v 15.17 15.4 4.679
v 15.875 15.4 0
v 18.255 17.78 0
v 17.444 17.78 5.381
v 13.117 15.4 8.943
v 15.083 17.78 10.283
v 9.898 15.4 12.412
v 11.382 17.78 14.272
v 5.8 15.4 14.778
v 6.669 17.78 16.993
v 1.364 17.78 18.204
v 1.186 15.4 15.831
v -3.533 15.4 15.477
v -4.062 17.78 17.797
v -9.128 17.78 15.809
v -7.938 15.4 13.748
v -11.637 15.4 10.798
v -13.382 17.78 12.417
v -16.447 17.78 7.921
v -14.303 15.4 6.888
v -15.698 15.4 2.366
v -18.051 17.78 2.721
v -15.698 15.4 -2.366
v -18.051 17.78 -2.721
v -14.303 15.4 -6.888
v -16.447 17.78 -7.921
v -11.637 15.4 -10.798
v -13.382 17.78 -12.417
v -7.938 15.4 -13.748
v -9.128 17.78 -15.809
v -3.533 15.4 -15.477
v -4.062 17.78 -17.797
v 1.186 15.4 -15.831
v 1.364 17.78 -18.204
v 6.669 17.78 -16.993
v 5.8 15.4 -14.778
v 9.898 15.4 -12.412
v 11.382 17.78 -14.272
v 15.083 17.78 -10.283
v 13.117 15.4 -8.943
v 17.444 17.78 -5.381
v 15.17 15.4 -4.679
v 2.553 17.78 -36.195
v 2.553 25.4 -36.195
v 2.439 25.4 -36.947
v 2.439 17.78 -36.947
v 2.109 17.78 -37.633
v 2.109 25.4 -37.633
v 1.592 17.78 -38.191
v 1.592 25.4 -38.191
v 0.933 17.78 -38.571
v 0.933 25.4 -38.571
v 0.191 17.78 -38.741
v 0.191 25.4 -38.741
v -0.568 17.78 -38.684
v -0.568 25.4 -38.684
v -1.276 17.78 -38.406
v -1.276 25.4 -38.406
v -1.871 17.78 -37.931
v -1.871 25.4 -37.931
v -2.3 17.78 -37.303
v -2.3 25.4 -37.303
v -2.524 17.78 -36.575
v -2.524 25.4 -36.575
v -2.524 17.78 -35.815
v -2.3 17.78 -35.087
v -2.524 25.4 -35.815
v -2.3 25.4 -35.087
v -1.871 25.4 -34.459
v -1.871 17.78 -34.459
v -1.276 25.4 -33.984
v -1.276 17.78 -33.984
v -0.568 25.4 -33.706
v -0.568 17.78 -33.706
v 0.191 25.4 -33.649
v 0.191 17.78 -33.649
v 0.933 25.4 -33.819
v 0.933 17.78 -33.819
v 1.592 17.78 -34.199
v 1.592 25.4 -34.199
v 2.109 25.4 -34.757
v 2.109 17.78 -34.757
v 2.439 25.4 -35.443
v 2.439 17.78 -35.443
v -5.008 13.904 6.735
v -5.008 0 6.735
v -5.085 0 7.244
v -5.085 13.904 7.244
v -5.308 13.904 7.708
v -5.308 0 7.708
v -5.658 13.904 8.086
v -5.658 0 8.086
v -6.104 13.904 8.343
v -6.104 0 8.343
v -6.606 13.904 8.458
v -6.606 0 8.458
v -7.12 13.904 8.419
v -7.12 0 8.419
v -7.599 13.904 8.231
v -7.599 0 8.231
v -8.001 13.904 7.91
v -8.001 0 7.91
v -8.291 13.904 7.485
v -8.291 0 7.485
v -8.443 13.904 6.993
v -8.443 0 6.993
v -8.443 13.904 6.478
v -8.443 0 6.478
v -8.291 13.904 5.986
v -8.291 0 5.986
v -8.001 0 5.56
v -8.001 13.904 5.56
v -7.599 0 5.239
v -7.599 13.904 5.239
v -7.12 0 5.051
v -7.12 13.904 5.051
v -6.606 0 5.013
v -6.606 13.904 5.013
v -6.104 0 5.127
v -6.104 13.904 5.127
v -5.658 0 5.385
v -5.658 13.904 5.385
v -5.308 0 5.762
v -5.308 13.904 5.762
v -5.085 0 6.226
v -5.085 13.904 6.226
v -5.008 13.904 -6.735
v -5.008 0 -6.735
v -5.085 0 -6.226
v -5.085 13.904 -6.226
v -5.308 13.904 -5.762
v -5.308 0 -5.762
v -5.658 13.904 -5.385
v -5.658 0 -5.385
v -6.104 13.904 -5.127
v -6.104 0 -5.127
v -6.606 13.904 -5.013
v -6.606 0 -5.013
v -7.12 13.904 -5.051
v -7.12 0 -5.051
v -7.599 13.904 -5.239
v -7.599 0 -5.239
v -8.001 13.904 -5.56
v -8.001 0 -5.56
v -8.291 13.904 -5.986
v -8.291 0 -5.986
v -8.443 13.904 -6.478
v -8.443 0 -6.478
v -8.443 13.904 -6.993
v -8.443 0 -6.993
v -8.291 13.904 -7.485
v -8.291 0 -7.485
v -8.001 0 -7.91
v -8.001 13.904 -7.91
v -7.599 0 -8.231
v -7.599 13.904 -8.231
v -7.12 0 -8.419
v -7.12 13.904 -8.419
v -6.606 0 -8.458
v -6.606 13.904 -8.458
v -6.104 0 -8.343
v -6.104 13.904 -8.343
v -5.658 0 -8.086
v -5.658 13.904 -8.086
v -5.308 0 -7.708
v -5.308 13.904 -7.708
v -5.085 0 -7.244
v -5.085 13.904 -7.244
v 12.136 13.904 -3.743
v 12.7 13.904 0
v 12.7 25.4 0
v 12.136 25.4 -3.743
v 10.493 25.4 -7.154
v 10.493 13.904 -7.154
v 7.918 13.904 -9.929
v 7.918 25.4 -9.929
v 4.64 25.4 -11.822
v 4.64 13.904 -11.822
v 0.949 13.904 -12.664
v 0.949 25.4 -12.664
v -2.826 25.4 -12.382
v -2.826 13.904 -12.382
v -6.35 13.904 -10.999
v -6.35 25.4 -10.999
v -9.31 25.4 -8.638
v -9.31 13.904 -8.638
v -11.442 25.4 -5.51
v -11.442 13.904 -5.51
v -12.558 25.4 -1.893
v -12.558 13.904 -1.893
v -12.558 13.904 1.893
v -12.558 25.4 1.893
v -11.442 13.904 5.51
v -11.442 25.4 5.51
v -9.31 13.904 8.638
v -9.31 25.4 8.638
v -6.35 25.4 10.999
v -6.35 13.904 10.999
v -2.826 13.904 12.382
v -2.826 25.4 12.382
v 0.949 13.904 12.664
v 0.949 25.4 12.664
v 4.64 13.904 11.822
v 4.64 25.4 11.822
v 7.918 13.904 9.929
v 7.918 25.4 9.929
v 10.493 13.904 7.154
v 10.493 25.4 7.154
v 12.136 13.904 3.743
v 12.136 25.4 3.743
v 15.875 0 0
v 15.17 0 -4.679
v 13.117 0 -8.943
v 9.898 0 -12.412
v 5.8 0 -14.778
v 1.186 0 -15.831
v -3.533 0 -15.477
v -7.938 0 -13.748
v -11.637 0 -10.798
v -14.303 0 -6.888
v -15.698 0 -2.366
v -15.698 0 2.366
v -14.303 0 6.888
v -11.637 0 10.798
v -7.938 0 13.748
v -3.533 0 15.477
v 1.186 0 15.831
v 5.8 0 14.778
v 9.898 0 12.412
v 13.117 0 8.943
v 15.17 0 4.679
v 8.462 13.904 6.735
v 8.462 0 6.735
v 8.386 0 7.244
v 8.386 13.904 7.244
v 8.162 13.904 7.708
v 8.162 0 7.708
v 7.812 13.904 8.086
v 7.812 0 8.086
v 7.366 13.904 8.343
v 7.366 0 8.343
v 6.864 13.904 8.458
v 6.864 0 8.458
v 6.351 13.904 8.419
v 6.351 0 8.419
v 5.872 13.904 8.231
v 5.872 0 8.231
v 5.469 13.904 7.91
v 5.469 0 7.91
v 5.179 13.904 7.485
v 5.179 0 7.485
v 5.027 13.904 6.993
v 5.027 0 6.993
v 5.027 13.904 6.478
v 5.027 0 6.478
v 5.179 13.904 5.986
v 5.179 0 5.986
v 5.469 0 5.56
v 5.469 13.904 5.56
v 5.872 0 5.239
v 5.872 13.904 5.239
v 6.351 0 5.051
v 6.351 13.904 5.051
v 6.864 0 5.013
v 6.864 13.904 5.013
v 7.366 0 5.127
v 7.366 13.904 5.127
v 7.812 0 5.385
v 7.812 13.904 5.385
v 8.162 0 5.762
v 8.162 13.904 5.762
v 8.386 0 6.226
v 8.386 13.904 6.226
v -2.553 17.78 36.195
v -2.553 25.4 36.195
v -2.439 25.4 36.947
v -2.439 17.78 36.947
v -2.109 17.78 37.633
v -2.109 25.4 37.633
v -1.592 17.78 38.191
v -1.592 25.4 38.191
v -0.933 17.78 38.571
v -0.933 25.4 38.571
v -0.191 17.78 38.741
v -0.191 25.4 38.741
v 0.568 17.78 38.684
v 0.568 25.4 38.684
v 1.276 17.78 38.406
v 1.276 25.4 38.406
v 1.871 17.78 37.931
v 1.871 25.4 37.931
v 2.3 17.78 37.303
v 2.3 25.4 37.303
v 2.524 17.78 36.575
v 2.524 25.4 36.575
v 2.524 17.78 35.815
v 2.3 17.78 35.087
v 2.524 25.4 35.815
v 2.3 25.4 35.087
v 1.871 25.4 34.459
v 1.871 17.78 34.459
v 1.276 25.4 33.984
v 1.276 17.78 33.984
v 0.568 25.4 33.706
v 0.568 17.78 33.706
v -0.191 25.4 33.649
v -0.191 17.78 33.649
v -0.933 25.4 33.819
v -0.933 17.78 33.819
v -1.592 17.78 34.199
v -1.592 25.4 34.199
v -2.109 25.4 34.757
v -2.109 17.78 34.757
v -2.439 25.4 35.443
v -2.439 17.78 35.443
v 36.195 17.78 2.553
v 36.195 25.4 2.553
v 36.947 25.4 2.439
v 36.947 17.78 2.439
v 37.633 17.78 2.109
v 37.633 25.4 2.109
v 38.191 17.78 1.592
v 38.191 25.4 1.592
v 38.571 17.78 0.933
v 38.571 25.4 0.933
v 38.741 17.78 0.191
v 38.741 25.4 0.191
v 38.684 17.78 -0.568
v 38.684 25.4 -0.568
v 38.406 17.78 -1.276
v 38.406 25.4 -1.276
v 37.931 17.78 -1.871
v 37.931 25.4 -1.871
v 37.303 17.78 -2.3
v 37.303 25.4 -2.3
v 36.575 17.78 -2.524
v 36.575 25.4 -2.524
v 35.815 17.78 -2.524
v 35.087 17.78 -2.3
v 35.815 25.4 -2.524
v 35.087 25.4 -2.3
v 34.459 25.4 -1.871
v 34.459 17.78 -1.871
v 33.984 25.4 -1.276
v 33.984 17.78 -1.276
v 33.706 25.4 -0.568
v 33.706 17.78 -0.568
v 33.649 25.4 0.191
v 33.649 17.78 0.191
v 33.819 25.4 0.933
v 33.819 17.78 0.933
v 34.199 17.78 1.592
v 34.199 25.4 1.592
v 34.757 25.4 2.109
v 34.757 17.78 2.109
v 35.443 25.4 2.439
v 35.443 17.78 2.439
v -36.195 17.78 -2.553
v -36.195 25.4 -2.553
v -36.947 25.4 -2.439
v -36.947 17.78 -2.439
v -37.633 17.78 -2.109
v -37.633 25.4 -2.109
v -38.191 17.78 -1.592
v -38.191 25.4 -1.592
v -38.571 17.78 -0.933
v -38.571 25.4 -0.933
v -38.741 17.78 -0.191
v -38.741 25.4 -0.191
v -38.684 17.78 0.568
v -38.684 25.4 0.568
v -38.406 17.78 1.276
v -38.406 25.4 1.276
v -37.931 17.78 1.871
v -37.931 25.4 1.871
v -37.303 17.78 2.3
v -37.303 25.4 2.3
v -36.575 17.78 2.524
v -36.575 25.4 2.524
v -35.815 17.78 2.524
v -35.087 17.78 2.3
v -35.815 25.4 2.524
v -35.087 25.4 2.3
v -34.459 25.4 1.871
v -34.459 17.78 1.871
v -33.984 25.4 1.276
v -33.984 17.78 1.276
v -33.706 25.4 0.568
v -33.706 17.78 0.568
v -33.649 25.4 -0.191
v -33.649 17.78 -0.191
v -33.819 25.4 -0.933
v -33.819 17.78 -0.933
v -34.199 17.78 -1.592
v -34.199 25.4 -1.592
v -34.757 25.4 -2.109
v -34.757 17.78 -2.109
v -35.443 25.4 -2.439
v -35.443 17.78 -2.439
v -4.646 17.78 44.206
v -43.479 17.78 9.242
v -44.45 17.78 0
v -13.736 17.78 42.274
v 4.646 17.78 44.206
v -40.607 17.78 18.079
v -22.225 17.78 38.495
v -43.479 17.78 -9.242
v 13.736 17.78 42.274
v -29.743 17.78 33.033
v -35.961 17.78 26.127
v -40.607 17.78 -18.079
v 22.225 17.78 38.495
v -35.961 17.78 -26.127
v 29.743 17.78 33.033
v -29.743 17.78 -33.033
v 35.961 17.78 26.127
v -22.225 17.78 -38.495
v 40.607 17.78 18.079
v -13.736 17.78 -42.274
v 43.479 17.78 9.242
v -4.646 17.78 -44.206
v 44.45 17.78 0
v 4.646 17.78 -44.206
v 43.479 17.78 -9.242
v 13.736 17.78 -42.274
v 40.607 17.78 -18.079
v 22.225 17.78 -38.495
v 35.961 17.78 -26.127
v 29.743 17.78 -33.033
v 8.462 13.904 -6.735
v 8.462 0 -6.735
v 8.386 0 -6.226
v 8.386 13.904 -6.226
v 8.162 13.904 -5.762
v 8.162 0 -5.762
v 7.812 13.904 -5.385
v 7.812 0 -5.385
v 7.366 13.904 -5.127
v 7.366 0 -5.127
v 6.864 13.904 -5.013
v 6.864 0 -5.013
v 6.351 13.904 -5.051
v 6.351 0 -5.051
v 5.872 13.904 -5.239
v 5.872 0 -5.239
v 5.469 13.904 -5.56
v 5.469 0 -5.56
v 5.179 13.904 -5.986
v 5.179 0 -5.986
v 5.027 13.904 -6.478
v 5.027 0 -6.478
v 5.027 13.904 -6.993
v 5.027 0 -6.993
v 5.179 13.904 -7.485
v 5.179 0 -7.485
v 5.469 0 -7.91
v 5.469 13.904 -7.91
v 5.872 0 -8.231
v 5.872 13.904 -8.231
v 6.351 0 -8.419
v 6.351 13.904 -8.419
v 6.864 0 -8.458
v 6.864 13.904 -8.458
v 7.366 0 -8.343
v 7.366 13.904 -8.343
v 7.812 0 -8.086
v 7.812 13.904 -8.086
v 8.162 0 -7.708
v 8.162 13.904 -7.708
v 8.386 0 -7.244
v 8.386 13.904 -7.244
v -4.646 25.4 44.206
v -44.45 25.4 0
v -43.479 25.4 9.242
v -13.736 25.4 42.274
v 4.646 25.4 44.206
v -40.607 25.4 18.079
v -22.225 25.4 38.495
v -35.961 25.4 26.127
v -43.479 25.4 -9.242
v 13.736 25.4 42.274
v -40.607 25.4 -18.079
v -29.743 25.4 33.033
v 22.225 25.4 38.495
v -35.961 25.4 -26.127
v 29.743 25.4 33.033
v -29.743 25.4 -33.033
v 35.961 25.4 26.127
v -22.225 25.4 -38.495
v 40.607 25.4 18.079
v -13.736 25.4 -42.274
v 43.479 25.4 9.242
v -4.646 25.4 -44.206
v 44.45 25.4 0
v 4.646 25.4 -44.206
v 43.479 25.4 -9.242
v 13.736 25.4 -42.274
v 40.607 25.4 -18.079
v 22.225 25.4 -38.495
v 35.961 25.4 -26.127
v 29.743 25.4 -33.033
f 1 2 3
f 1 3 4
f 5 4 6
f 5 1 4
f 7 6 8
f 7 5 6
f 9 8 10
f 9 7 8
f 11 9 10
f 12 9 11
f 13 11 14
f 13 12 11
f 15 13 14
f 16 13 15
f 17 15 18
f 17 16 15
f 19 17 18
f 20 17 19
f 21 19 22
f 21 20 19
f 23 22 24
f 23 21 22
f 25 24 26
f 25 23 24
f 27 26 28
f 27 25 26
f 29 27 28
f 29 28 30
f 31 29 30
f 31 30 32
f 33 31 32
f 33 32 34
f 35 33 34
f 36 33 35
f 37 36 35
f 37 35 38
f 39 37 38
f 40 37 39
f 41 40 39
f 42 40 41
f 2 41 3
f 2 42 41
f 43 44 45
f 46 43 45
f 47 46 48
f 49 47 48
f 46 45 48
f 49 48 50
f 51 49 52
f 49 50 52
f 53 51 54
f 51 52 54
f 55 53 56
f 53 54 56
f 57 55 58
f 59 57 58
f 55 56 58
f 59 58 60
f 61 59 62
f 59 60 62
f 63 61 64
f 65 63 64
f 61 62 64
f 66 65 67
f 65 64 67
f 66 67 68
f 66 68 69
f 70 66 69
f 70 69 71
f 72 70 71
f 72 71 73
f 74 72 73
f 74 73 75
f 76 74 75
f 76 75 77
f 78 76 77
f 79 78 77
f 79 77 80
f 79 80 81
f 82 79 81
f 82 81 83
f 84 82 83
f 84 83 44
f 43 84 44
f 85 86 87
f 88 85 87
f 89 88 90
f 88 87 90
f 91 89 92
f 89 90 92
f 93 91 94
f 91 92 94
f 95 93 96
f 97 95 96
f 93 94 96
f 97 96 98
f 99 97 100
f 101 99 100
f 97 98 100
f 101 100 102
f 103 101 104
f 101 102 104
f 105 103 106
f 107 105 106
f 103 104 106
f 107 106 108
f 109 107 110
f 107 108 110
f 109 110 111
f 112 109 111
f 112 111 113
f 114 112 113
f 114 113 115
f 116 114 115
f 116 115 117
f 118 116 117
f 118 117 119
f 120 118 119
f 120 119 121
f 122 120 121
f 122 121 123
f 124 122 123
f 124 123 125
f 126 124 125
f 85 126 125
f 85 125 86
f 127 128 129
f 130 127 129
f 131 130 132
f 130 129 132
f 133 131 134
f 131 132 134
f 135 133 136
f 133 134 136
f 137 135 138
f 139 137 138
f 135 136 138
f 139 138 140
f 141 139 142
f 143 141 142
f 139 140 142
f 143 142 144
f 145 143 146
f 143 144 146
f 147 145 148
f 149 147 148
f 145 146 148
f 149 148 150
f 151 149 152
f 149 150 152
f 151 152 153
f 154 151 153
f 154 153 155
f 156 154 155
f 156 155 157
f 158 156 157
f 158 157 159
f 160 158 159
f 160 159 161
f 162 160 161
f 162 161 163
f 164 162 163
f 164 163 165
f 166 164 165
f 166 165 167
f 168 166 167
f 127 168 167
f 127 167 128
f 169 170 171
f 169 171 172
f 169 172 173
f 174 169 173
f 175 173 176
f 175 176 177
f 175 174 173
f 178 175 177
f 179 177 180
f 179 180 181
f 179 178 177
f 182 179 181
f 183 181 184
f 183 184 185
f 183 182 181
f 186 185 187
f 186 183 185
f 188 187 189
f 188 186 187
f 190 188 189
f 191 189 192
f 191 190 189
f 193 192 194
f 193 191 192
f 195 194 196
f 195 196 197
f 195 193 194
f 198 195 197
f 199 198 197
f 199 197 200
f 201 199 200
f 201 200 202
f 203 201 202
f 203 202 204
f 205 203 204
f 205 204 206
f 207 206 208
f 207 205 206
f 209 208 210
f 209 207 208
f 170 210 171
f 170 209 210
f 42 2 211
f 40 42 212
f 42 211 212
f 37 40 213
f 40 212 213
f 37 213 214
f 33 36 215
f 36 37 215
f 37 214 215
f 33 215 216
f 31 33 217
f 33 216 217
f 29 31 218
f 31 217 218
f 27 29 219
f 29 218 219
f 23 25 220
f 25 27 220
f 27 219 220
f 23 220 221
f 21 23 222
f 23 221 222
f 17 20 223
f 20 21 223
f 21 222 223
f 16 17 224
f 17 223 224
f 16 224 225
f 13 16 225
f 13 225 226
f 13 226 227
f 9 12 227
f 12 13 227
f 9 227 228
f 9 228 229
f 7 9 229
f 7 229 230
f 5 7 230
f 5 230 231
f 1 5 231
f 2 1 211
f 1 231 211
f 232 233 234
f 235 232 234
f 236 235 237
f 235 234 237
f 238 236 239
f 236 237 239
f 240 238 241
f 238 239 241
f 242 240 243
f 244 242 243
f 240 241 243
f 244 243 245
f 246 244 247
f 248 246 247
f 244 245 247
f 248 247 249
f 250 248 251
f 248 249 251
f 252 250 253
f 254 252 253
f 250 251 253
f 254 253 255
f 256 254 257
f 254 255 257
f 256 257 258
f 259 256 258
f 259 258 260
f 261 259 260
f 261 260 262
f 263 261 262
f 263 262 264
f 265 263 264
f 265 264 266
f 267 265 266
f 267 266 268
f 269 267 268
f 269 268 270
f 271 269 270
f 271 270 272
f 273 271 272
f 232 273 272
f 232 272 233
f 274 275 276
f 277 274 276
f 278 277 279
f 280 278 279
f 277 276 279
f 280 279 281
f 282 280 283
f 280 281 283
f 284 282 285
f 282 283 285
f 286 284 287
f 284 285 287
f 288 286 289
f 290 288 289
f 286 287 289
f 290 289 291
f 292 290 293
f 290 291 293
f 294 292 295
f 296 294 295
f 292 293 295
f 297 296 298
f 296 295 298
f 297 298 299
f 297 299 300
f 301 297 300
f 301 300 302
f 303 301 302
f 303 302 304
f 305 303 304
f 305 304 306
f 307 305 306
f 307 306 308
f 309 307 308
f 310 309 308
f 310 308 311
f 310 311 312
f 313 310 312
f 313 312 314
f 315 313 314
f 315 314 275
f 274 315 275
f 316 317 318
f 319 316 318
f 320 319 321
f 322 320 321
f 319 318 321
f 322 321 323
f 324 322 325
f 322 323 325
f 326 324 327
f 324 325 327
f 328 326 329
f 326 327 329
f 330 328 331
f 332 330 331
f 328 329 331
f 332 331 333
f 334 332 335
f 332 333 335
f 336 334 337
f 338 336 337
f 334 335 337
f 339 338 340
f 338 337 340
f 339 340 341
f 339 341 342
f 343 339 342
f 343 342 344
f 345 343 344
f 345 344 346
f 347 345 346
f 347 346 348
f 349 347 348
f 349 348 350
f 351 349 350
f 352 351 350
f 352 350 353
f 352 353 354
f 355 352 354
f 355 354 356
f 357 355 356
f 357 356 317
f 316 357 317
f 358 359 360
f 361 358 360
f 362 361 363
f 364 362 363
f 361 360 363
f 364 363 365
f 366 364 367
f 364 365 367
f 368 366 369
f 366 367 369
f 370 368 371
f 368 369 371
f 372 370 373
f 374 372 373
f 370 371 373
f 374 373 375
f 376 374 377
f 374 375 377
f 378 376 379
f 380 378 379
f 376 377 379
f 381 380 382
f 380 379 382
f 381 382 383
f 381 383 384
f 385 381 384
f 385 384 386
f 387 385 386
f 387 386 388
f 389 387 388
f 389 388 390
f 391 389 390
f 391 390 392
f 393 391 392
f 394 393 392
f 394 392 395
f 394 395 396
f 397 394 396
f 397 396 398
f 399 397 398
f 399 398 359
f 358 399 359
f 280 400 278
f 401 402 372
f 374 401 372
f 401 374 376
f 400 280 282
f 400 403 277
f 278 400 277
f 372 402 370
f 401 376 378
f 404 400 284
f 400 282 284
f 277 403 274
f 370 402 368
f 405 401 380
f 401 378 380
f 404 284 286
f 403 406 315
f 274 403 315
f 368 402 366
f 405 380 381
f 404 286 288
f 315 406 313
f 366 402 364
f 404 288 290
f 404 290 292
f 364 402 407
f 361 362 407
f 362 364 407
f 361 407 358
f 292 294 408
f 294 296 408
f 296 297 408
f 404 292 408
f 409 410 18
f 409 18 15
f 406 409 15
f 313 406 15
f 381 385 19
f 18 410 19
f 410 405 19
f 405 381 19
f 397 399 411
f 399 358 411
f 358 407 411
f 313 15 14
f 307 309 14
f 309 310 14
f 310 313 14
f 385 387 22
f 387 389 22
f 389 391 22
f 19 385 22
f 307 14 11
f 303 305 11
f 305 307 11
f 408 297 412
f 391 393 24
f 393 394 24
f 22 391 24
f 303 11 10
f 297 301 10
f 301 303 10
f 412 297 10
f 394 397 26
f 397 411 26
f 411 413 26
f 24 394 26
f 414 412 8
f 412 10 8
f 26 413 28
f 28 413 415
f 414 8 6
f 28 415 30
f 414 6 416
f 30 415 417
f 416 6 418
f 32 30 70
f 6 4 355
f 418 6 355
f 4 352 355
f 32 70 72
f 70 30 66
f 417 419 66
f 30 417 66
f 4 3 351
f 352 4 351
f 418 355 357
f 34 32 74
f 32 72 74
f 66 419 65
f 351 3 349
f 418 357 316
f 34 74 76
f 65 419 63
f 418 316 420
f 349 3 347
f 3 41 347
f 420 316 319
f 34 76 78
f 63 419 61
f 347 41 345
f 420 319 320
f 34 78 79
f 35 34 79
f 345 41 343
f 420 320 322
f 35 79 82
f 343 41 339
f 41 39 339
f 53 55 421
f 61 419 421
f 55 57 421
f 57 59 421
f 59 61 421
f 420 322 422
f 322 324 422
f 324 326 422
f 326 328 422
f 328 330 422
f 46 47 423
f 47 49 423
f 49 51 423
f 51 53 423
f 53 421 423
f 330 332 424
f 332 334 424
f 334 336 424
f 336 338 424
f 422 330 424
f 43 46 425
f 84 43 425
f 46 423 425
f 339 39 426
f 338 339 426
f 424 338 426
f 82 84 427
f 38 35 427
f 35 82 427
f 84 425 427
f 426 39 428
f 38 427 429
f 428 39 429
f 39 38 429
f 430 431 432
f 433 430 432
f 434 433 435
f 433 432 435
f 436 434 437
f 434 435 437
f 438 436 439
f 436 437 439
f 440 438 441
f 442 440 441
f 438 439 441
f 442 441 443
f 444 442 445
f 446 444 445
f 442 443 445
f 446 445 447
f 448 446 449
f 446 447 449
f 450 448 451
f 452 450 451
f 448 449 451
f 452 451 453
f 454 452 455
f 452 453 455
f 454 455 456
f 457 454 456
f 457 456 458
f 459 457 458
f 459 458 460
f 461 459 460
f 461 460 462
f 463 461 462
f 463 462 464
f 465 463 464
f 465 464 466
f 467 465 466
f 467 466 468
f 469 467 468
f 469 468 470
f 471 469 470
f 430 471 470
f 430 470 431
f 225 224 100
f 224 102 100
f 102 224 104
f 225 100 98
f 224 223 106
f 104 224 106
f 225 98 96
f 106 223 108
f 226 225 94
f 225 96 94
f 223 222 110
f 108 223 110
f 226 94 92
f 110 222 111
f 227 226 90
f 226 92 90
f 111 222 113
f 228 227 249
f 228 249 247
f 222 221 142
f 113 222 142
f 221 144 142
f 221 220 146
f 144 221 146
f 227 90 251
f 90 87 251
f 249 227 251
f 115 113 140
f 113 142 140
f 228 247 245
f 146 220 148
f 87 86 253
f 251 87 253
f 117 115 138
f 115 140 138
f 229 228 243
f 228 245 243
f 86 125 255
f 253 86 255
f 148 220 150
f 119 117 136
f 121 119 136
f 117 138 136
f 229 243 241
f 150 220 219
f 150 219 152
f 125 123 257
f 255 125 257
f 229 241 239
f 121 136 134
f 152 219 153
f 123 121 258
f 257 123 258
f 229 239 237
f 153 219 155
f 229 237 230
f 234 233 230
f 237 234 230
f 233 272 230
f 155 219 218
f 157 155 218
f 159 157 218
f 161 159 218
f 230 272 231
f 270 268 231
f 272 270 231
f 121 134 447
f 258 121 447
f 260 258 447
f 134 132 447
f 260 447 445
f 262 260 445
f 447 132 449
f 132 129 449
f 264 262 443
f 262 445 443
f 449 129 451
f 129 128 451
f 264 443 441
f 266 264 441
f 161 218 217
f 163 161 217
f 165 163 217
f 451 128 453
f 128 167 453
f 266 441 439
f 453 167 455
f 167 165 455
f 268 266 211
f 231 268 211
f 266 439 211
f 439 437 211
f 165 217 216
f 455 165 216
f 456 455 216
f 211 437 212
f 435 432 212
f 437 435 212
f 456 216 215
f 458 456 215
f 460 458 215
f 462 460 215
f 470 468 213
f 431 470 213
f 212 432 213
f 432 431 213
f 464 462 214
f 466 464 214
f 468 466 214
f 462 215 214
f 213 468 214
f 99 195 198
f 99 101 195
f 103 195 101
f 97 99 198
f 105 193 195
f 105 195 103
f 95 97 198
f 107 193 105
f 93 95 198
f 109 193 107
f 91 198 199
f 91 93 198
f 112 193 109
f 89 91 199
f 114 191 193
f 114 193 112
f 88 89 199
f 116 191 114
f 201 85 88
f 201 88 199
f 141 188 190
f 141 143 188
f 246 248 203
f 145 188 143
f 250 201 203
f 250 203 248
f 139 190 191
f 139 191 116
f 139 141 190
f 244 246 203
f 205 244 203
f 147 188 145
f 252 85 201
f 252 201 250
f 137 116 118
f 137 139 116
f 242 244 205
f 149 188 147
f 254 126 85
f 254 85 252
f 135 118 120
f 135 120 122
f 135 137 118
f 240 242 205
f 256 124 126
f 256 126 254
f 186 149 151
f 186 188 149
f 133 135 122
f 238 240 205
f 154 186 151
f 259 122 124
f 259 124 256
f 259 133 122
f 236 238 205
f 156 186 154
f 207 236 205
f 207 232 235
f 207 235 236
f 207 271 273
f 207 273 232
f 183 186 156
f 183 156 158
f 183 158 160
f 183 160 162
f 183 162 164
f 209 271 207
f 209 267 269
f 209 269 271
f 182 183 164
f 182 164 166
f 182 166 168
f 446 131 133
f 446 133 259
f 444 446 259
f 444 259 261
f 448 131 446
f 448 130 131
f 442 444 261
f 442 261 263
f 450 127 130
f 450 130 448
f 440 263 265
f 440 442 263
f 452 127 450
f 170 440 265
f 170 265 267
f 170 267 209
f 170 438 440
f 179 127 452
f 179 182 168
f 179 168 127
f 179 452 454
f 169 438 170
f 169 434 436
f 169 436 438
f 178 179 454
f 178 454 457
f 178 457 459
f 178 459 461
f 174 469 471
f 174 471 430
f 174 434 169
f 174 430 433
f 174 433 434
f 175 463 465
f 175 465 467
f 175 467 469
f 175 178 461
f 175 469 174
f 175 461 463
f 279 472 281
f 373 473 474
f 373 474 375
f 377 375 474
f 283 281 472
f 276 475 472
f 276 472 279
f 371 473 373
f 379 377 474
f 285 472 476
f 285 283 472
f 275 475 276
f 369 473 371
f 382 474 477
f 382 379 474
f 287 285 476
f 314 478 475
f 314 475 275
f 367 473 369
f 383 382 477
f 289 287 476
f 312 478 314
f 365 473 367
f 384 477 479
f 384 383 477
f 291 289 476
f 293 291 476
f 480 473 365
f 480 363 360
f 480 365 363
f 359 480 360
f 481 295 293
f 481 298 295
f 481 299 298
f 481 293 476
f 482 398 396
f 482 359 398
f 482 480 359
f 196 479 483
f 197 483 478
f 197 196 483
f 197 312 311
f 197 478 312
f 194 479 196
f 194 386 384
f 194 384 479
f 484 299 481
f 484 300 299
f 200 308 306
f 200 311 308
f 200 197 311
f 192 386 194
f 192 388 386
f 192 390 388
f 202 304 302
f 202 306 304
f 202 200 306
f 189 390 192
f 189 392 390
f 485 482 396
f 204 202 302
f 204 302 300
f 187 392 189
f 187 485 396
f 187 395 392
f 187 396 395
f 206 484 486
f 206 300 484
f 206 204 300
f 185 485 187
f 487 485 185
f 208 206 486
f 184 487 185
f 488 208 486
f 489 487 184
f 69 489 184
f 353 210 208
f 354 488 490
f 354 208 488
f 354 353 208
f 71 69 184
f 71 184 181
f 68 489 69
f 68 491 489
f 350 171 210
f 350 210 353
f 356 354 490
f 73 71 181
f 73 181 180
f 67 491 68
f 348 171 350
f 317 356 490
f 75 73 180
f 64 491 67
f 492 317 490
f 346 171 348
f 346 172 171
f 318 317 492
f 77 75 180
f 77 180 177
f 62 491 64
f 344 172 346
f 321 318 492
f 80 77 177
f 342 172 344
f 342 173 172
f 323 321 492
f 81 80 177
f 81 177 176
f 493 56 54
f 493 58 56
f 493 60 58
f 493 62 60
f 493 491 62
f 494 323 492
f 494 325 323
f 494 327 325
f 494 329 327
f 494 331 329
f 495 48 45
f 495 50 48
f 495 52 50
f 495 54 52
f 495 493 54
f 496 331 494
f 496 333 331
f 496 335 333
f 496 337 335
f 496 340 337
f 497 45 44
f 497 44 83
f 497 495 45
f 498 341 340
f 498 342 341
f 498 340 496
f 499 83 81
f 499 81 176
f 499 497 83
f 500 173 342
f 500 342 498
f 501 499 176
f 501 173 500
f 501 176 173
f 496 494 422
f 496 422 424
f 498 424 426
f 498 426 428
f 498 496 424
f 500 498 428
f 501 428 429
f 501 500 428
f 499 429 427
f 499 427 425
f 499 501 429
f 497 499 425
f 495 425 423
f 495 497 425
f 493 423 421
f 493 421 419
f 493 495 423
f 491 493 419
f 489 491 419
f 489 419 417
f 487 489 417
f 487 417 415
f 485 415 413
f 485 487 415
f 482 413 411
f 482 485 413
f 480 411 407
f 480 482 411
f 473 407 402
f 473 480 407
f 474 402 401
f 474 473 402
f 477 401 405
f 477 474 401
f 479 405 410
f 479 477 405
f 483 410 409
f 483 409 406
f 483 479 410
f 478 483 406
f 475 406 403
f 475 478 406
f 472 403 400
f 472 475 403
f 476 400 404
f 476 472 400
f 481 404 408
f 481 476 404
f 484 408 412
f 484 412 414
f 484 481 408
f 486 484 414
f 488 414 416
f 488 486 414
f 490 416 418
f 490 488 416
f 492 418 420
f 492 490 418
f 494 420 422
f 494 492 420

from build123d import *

# Parameters (mm, degrees)
SKETCH1_R           = 15.875
BOSS_EXTRUDE1_DEPTH = 25.4
SKETCH4_R           = 44.45
BOSS_EXTRUDE2_DEPTH = 7.62
SKETCH6_R           = 2.5527
CUT_EXTRUDE4_DEPTH  = 26.4
CIRPATTERN2_COUNT   = 4
CUT_EXTRUDE5_START  = -11.49604
SKETCH2_R           = 12.7
CUT_EXTRUDE5_DEPTH  = 11.49604
CHAMFER1_SIZE       = 2.38
SKETCH3_R           = 1.7272
CUT_EXTRUDE6_DEPTH  = 26.4


with BuildPart() as part:
    # Sketch1 → Boss-Extrude1 (new body)
    with BuildSketch(Plane(origin=(0, 0, 0), x_dir=(1, 0, 0), z_dir=(0, 1, 0))):
        Circle(SKETCH1_R)
    extrude(amount=BOSS_EXTRUDE1_DEPTH)

    # Sketch4 → Boss-Extrude2 (add)
    with BuildSketch(Plane(origin=(0, 25.4, 0), x_dir=(1, 0, 0), z_dir=(0, 1, 0))):
        Circle(SKETCH4_R)
    extrude(amount=-BOSS_EXTRUDE2_DEPTH)

    # Sketch6 → Cut-Extrude4 (cut, through all)
    with BuildSketch(Plane(origin=(0, 25.4, 0), x_dir=(1, 0, 0), z_dir=(0, 1, 0))):
        with Locations((0, 36.195)):
            Circle(SKETCH6_R)
    cut_extrude4 = extrude(amount=-CUT_EXTRUDE4_DEPTH, mode=Mode.SUBTRACT)

    # CirPattern2: Cut-Extrude4 ×4 about axis
    cirpattern2_axis = Axis((0, 0, 0), (0, 1, 0))
    for i in range(1, CIRPATTERN2_COUNT):
        add(cut_extrude4.rotate(cirpattern2_axis, i * 360 / CIRPATTERN2_COUNT), mode=Mode.SUBTRACT)

    # Sketch2 → Cut-Extrude5 (cut)
    with BuildSketch(Plane(origin=(0, 25.4, 0), x_dir=(1, 0, 0), z_dir=(0, 1, 0)).offset(CUT_EXTRUDE5_START)):
        Circle(SKETCH2_R)
    extrude(amount=CUT_EXTRUDE5_DEPTH, mode=Mode.SUBTRACT)

    # Chamfer1
    chamfer1_edges = [part.edges().sort_by_distance(p)[0] for p in [
        (-15.875, 17.78, 0),
    ]]
    chamfer(chamfer1_edges, length=CHAMFER1_SIZE)

    # Sketch3 → Cut-Extrude6 (cut, through all)
    with BuildSketch(Plane.XZ):
        with Locations((6.735192091, -6.735192091)):
            Circle(SKETCH3_R)
        with Locations((-6.735192091, -6.735192091)):
            Circle(SKETCH3_R)
        with Locations((-6.735192091, 6.735192091)):
            Circle(SKETCH3_R)
        with Locations((6.735192091, 6.735192091)):
            Circle(SKETCH3_R)
    extrude(amount=-CUT_EXTRUDE6_DEPTH, mode=Mode.SUBTRACT)


solid = part.part
